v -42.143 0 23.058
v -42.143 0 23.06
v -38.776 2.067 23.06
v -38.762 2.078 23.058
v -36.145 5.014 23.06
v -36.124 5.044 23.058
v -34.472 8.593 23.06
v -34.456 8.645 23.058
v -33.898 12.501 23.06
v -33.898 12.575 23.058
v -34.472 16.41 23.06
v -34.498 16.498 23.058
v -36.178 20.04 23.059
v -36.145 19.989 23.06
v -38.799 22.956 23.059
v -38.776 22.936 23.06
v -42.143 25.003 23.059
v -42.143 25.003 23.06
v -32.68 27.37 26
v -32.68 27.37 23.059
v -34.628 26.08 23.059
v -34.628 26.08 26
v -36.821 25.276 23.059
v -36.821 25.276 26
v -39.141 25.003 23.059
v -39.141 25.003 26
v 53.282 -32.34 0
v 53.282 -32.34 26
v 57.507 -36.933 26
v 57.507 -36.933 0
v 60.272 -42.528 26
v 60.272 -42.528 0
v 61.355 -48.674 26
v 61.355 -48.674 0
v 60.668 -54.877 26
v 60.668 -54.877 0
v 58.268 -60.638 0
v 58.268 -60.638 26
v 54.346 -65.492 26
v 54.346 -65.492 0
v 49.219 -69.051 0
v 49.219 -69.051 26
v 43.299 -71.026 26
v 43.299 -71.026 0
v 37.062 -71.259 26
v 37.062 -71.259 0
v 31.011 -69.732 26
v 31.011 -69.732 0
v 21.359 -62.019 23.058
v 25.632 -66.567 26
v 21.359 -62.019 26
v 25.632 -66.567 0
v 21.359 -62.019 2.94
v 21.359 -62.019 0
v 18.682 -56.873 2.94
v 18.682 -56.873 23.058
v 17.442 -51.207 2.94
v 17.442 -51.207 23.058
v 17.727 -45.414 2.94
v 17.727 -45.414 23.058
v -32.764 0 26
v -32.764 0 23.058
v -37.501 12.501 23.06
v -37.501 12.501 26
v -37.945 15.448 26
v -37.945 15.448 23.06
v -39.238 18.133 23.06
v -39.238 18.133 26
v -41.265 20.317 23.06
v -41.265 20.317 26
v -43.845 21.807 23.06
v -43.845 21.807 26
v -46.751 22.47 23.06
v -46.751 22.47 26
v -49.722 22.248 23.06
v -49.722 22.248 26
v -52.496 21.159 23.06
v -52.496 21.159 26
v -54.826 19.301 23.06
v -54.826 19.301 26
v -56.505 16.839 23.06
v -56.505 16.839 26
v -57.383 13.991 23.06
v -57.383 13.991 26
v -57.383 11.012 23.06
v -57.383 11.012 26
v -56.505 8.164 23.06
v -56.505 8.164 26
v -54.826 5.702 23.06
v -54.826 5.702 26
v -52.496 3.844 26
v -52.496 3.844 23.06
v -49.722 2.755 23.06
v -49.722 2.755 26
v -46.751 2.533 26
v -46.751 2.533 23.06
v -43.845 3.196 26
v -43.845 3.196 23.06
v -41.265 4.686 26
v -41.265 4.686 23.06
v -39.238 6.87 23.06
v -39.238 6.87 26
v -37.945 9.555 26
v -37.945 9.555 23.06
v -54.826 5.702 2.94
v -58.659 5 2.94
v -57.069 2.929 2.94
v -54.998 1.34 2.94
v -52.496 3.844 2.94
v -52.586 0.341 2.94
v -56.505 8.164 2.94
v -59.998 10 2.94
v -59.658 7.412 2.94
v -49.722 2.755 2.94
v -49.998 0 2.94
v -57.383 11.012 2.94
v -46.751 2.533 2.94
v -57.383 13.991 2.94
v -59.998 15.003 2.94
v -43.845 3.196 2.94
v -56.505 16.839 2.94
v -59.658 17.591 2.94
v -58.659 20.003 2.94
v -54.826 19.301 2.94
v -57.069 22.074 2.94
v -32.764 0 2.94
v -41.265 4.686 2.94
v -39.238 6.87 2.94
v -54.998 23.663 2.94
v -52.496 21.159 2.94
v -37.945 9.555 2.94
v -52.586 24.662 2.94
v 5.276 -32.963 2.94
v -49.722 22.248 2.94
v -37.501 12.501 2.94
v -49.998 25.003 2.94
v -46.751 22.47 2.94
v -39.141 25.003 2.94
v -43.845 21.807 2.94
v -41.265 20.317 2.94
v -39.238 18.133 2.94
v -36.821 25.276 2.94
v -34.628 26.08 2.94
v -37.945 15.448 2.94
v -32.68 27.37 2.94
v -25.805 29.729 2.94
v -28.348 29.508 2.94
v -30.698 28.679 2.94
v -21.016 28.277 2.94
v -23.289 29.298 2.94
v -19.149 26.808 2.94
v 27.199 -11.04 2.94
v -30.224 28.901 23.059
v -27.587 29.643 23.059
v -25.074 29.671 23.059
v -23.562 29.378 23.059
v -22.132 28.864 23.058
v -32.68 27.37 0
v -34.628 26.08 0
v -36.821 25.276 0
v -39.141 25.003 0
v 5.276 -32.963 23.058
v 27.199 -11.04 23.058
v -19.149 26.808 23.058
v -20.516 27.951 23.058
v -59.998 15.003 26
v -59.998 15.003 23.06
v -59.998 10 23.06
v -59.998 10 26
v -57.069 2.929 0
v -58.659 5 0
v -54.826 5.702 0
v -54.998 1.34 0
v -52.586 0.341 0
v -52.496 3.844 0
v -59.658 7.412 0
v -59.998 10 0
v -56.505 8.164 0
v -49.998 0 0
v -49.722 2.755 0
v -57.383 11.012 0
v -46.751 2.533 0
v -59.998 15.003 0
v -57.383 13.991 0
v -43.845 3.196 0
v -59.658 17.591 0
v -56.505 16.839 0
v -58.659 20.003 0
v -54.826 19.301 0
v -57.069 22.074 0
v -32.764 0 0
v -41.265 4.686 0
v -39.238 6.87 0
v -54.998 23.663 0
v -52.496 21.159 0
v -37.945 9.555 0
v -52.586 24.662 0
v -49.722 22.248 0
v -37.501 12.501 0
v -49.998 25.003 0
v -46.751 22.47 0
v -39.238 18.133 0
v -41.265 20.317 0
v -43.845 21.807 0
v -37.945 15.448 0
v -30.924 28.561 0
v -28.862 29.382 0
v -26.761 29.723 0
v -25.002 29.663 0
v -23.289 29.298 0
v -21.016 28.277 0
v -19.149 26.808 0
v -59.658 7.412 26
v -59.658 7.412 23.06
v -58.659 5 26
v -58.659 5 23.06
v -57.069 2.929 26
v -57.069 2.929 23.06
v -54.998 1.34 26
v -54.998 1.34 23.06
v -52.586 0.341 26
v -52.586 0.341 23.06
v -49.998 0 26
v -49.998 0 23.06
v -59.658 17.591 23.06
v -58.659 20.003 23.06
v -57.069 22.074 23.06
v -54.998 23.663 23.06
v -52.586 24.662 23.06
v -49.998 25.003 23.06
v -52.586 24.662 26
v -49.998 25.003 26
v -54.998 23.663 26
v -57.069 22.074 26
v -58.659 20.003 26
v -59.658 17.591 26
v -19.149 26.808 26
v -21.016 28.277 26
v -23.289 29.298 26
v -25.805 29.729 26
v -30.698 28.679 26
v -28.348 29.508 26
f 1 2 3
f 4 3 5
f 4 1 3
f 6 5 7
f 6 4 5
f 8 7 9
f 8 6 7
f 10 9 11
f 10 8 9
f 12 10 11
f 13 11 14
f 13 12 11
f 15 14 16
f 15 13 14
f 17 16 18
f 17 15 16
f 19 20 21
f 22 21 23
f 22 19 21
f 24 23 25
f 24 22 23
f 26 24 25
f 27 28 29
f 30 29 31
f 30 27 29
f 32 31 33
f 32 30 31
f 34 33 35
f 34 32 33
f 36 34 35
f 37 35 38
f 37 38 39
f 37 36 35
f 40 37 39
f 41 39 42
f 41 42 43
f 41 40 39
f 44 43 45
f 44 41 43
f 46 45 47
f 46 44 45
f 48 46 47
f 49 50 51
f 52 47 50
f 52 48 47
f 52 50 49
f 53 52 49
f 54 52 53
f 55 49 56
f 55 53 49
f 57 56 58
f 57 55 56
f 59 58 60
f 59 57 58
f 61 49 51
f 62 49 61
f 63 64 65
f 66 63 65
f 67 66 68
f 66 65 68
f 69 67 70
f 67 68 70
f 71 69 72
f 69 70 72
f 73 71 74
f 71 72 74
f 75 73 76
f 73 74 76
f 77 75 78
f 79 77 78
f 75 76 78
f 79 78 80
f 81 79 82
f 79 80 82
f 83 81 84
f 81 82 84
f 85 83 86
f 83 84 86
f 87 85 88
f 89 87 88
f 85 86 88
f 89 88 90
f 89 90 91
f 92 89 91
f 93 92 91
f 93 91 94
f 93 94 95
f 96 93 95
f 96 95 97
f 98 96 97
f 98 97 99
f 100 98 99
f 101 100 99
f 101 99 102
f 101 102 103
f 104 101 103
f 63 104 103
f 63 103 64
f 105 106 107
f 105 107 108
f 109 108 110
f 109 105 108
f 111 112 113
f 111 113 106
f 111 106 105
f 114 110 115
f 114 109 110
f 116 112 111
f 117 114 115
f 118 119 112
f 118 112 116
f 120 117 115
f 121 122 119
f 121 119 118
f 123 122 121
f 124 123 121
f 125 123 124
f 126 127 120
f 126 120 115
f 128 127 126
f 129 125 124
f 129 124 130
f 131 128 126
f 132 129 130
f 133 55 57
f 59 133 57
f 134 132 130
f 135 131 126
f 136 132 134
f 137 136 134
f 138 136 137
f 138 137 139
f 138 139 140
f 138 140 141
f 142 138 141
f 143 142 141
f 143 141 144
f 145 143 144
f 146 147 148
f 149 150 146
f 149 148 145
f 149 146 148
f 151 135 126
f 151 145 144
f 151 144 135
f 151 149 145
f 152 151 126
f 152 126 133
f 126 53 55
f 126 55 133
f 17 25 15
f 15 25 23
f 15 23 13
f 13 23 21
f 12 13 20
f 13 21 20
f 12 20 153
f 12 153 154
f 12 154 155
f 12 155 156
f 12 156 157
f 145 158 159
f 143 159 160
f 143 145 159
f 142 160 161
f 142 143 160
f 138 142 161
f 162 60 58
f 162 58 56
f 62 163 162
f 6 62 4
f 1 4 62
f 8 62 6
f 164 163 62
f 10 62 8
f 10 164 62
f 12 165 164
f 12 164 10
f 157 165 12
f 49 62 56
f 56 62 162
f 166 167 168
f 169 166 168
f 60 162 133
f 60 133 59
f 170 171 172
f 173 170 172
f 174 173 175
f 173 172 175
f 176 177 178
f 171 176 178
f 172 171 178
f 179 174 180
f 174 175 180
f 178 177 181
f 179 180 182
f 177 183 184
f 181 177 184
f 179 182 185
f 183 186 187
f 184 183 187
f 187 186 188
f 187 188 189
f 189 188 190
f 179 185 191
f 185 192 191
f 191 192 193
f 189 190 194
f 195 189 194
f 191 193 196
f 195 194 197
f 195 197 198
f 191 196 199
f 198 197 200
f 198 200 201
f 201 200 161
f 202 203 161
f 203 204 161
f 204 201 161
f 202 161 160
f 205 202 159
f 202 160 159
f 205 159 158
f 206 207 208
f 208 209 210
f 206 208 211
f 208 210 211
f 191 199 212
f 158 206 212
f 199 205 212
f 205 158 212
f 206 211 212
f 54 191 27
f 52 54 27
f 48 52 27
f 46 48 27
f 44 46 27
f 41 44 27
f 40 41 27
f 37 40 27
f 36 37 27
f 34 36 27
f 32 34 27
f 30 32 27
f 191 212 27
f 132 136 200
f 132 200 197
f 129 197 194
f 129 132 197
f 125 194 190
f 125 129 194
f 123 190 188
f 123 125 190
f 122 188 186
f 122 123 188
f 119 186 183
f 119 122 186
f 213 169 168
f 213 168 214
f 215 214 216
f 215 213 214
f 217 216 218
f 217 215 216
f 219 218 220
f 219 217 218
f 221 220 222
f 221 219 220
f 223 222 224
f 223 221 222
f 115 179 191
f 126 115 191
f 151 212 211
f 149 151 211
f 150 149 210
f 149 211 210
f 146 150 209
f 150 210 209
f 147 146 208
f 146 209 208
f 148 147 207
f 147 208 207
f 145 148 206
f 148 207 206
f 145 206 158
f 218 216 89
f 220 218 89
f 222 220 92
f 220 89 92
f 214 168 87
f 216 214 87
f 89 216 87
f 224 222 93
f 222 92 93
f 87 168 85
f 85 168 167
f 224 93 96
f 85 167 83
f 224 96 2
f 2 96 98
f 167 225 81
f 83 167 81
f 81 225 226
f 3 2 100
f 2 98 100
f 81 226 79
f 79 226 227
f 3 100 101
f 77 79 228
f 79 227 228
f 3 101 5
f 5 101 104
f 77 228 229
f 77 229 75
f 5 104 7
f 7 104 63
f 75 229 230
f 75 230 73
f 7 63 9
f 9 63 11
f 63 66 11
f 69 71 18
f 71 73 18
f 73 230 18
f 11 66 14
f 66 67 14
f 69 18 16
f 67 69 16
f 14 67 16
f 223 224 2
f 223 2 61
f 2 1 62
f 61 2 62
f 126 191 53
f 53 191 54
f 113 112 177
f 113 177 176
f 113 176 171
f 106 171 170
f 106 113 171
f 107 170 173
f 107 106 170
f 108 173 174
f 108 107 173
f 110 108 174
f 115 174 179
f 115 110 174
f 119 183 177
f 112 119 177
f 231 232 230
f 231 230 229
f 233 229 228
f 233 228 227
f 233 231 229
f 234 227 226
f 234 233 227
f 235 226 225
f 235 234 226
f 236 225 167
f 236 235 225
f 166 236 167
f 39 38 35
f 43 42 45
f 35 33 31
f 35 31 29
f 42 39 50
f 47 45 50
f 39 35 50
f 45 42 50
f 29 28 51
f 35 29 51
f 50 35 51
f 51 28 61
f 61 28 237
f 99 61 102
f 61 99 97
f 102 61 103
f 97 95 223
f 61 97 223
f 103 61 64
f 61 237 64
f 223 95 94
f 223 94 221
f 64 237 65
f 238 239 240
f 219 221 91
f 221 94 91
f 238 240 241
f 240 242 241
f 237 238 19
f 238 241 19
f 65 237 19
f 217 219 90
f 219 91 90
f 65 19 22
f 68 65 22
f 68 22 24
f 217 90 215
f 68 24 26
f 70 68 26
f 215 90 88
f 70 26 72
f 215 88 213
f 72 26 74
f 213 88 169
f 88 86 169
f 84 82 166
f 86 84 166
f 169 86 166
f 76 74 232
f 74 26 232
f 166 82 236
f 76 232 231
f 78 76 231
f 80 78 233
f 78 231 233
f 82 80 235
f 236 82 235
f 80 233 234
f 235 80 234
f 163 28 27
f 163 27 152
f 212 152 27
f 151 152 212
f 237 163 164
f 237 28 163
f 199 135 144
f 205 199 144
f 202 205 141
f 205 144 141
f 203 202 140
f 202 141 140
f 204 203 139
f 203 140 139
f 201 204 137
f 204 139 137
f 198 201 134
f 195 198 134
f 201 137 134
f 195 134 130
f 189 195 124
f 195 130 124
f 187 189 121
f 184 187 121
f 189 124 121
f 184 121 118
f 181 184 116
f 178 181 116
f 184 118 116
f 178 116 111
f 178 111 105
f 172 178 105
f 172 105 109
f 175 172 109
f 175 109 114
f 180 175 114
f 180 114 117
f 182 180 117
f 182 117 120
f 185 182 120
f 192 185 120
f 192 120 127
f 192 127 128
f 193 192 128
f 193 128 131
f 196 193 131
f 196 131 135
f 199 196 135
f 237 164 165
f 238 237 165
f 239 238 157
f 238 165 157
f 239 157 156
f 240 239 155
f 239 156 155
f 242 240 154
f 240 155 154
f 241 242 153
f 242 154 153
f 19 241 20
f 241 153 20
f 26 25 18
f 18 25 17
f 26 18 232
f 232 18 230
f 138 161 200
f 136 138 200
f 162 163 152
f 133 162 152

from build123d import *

# Parameters (mm, degrees)
EXTRUDE_1_DEPTH      = 26
SKETCH_4_R           = 9.996910884
CUT_EXTRUDE_2_DEPTH  = 26
FILLET_1_R           = 10
FILLET_2_R           = 10
CUT_EXTRUDE_4_DEPTH  = 26
SKETCH_8_R           = 13.6
CUT_EXTRUDE_5_DEPTH  = 20.12
EXTRUDE_2_DEPTH      = 26
FILLET_3_R           = 3
CUT_EXTRUDE_6_DEPTH  = 30
FILLET_9_R           = 10
FILLET_10_R          = 3
FILLET_11_R          = 10
CUT_EXTRUDE_7_DEPTH  = 30
SKETCH_13_W          = 20.118493956
SKETCH_13_H          = 70
CUT_EXTRUDE_8_DEPTH  = 44.75
CUT_EXTRUDE_9_DEPTH  = 44.75
SKETCH_15_R          = 22
EXTRUDE_3_DEPTH      = 26
EXTRUDE_4_REACH      = 99.657
CUT_EXTRUDE_13_DEPTH = 20
EXTRUDE_START        = -2.941506044
EXTRUDE_5_DEPTH      = 2.941506044
EXTRUDE_6_DEPTH      = 2.94


with BuildPart() as part:
    # 草图1 → 凸台-拉伸1 (new body)
    with BuildSketch(Plane.XY):
        Polygon((0, 0), (60.004097951, 0), (60.004097951, 25.002996284), (-59.998288516, 25.002996284), (-59.998288516, 0), align=None)
    extrude(amount=EXTRUDE_1_DEPTH)

    # 草图4 → 切除-拉伸2 (cut)
    with BuildSketch(Plane.XY.offset(26)):
        with Locations((-47.497668288, 12.501498142)):
            Circle(SKETCH_4_R)
    extrude(amount=-CUT_EXTRUDE_2_DEPTH, mode=Mode.SUBTRACT)

    # 圆角1
    fillet_1_edges = [part.edges().sort_by_distance(p)[0] for p in [
        (-59.998288516, 25.002996284, 13),
    ]]
    fillet(fillet_1_edges, radius=FILLET_1_R)

    # 圆角2
    fillet_2_edges = [part.edges().sort_by_distance(p)[0] for p in [
        (-59.998288516, 0, 13),
    ]]
    fillet(fillet_2_edges, radius=FILLET_2_R)

    # 草图7 → 切除-拉伸4 (cut)
    with BuildSketch(Plane(origin=(0, 25.002996284, 0), x_dir=(1, 0, 0), z_dir=(0, 1, 0))):
        Polygon((-37.501471928, -23.058493956), (-36.401101967, -23.058493956), (-36.401101967, -2.94), (-37.501471928, -2.94), (-62.053584156, -2.94), (-62.053584156, -23.058493956), align=None)
    extrude(amount=-CUT_EXTRUDE_4_DEPTH, mode=Mode.SUBTRACT)

    # 草图8 → 切除-拉伸5 (cut)
    with BuildSketch(Plane.XY.offset(2.94)):
        with Locations((-47.497668288, 12.501498142)):
            Circle(SKETCH_8_R)
    extrude(amount=CUT_EXTRUDE_5_DEPTH, mode=Mode.SUBTRACT)

    # 草图9 → 凸台-拉伸2 (add)
    with BuildSketch(Plane.XY.offset(26)):
        Polygon((-34.9988745, 25.002996284), (-22.500080712, 12.501498142), (-27.68722448, 0), (39.366276038, -67.053500518), (48.202948014, -58.216828542), (57.0397416, -49.380034956), (-17.34328964, 25.002996284), (-26.17108207, 33.830788714), align=None)
    extrude(amount=-EXTRUDE_2_DEPTH)

    # 圆角3
    fillet_3_edges = [part.edges().sort_by_distance(p)[0] for p in [
        (-36.401101967, 0, 12.999246978),
        (-36.401101967, 20.36446297, 12.999246978),
        (-36.401101967, 4.638533314, 12.999246978),
    ]]
    fillet(fillet_3_edges, radius=FILLET_3_R)

    # 草图10 → 切除-拉伸6 (cut)
    with BuildSketch(Plane.XY.offset(26)):
        Polygon((7.659706645, 0), (60.004097951, 0), (60.004097951, 25.002996284), (-17.34328964, 25.002996284), align=None)
    extrude(amount=-CUT_EXTRUDE_6_DEPTH, mode=Mode.SUBTRACT)

    # 圆角9
    # the kernel refuses this fillet: 10 mm, written as the material it adds along each edge
    with BuildSketch(Plane(origin=(-34.9988745, 25.002996284, 26), x_dir=(-1, 0, 0), z_dir=(0, 0, -1))) as fillet_9_piece_1_section:
        with BuildLine():
            CenterArc((FILLET_9_R * 0.414213562373, FILLET_9_R), FILLET_9_R, 225, 45)
            Line((-FILLET_9_R * 0.292893218813, FILLET_9_R * 0.292893218813), (0, 0))
            Line((0, 0), (FILLET_9_R * 0.414213562373, 0))
        make_face()
    fillet_9_piece_1 = extrude(amount=26, mode=Mode.PRIVATE)
    fillet_9_piece_1 = split(fillet_9_piece_1, bisect_by=Plane(origin=(-36.401101967, 24.986097048, 24.529246978), z_dir=(-1, 0, 0)), keep=Keep.TOP, mode=Mode.PRIVATE)
    fillet_9_piece_1 = split(fillet_9_piece_1, bisect_by=Plane(origin=(-37.504554949, 24.986097048, 23.058493956), z_dir=(0, 0, 1)), keep=Keep.TOP, mode=Mode.PRIVATE)
    add(fillet_9_piece_1)
    with BuildSketch(Plane(origin=(-34.9988745, 25.002996284, 26), x_dir=(-1, 0, 0), z_dir=(0, 0, -1))) as fillet_9_piece_2_section:
        with BuildLine():
            CenterArc((FILLET_9_R * 0.414213562373, FILLET_9_R), FILLET_9_R, 225, 45)
            Line((-FILLET_9_R * 0.292893218813, FILLET_9_R * 0.292893218813), (0, 0))
            Line((0, 0), (FILLET_9_R * 0.414213562373, 0))
        make_face()
    fillet_9_piece_2 = extrude(amount=26, mode=Mode.PRIVATE)
    fillet_9_piece_2 = split(fillet_9_piece_2, bisect_by=Plane(origin=(-36.401101967, 25.815006688, 24.529246978), z_dir=(1, 0, 0)), keep=Keep.TOP, mode=Mode.PRIVATE)
    fillet_9_piece_2 = split(fillet_9_piece_2, bisect_by=Plane(origin=(-34.567927652, 25.815006688, 23.058493956), z_dir=(0, 0, 1)), keep=Keep.TOP, mode=Mode.PRIVATE)
    add(fillet_9_piece_2)
    with BuildSketch(Plane(origin=(-34.9988745, 25.002996284, 26), x_dir=(-1, 0, 0), z_dir=(0, 0, -1))) as fillet_9_piece_3_section:
        with BuildLine():
            CenterArc((FILLET_9_R * 0.414213562373, FILLET_9_R), FILLET_9_R, 225, 45)
            Line((-FILLET_9_R * 0.292893218813, FILLET_9_R * 0.292893218813), (0, 0))
            Line((0, 0), (FILLET_9_R * 0.414213562373, 0))
        make_face()
    fillet_9_piece_3 = extrude(amount=26, mode=Mode.PRIVATE)
    fillet_9_piece_3 = split(fillet_9_piece_3, bisect_by=Plane(origin=(-34.567927652, 25.815006688, 2.94), z_dir=(0, 0, 1)), keep=Keep.TOP, mode=Mode.PRIVATE)
    fillet_9_piece_3 = split(fillet_9_piece_3, bisect_by=Plane(origin=(-36.401101967, 25.815006688, 12.999246978), z_dir=(1, 0, 0)), keep=Keep.TOP, mode=Mode.PRIVATE)
    fillet_9_piece_3 = split(fillet_9_piece_3, bisect_by=Plane(origin=(-34.567927652, 25.815006688, 23.058493956), z_dir=(0, 0, -1)), keep=Keep.TOP, mode=Mode.PRIVATE)
    add(fillet_9_piece_3)
    with BuildSketch(Plane(origin=(-34.9988745, 25.002996284, 26), x_dir=(-1, 0, 0), z_dir=(0, 0, -1))) as fillet_9_piece_4_section:
        with BuildLine():
            CenterArc((FILLET_9_R * 0.414213562373, FILLET_9_R), FILLET_9_R, 225, 45)
            Line((-FILLET_9_R * 0.292893218813, FILLET_9_R * 0.292893218813), (0, 0))
            Line((0, 0), (FILLET_9_R * 0.414213562373, 0))
        make_face()
    fillet_9_piece_4 = extrude(amount=26, mode=Mode.PRIVATE)
    fillet_9_piece_4 = split(fillet_9_piece_4, bisect_by=Plane(origin=(-37.504554949, 24.986097048, 2.94), z_dir=(0, 0, -1)), keep=Keep.TOP, mode=Mode.PRIVATE)
    fillet_9_piece_4 = split(fillet_9_piece_4, bisect_by=Plane(origin=(-36.401101967, 24.986097048, 1.47), z_dir=(-1, 0, 0)), keep=Keep.TOP, mode=Mode.PRIVATE)
    add(fillet_9_piece_4)
    with BuildSketch(Plane(origin=(-34.9988745, 25.002996284, 26), x_dir=(-1, 0, 0), z_dir=(0, 0, -1))) as fillet_9_piece_5_section:
        with BuildLine():
            CenterArc((FILLET_9_R * 0.414213562373, FILLET_9_R), FILLET_9_R, 225, 45)
            Line((-FILLET_9_R * 0.292893218813, FILLET_9_R * 0.292893218813), (0, 0))
            Line((0, 0), (FILLET_9_R * 0.414213562373, 0))
        make_face()
    fillet_9_piece_5 = extrude(amount=26, mode=Mode.PRIVATE)
    fillet_9_piece_5 = split(fillet_9_piece_5, bisect_by=Plane(origin=(-34.567927652, 25.815006688, 2.94), z_dir=(0, 0, -1)), keep=Keep.TOP, mode=Mode.PRIVATE)
    fillet_9_piece_5 = split(fillet_9_piece_5, bisect_by=Plane(origin=(-36.401101967, 25.815006688, 1.47), z_dir=(1, 0, 0)), keep=Keep.TOP, mode=Mode.PRIVATE)
    add(fillet_9_piece_5)

    # 圆角10
    fillet_10_edges = [part.edges().sort_by_distance(p)[0] for p in [
        (-36.401101967, 25.385673201, 12.999246978),
    ]]
    fillet(fillet_10_edges, radius=FILLET_10_R)

    # 圆角11
    fillet_11_edges = [part.edges().sort_by_distance(p)[0] for p in [
        (-26.17108207, 33.830788714, 13),
    ]]
    fillet(fillet_11_edges, radius=FILLET_11_R)

    # 草图12 → 切除-拉伸7 (cut)
    with BuildSketch(Plane(origin=(3.829853322, 3.829853322, 0), x_dir=(0, 0, -1), z_dir=(0.7071067811865404, 0.7071067811865547, 0))):
        Polygon((-12.999246978, 43.121170069), (-9.998089183, 43.121170069), (-9.998089183, 23.118852005), (-15.995491838, 23.118852005), (-15.995491838, 43.121170069), align=None)
    extrude(amount=-CUT_EXTRUDE_7_DEPTH, mode=Mode.SUBTRACT)

    # 草图13 → 切除-拉伸8 (cut, symmetric)
    with BuildSketch(Plane(origin=(3.829853322, 3.829853322, 0), x_dir=(0, 0, -1), z_dir=(0.7071067811865404, 0.7071067811865547, 0))):
        with Locations((-12.999246978, 7.961145372)):
            Rectangle(SKETCH_13_W, SKETCH_13_H)
    extrude(amount=CUT_EXTRUDE_8_DEPTH, both=True, mode=Mode.SUBTRACT)

    # 草图14 → 切除-拉伸9 (cut, symmetric)
    with BuildSketch(Plane(origin=(3.829853322, 3.829853322, 0), x_dir=(0, 0, -1), z_dir=(0.7071067811865404, 0.7071067811865547, 0))):
        Polygon((-23.06, 55.962849268), (-23.058493956, 36.05981453), (-2.94, 36.05981453), (-2.94, 55.962849268), align=None)
    extrude(amount=CUT_EXTRUDE_9_DEPTH, both=True, mode=Mode.SUBTRACT)

    # 草图15 → 凸台-拉伸3 (add)
    with BuildSketch(Plane(origin=(0, 0, 0), x_dir=(-1, 0, 0), z_dir=(0, 0, -1))):
        with Locations((-39.366276038, -49.380034956)):
            Circle(SKETCH_15_R)
    extrude(amount=-EXTRUDE_3_DEPTH)

    # 凸台-拉伸4: up to this face of the body (flat: up to its plane)
    extrude_4_end = Plane(part.part.faces().sort_by_distance((10.252727371, -21.880412524, 0))[0])
    # 草图16 → 凸台-拉伸4 (add, up to the picked face)
    with BuildSketch(Plane.XY.offset(26), mode=Mode.PRIVATE) as extrude_4_sk1:
        with BuildLine():
            Line((53.281607925, -32.339978076), (-19.148678719, 26.808385364))
            Line((-19.148678719, 26.808385364), (35.400190623, -27.740483979))
            ThreePointArc((35.400190623, -27.740483979), (44.846760764, -28.073597263), (53.281607925, -32.339978076))
        make_face()
    extrude_4_tool1 = split(extrude(extrude_4_sk1.sketch, amount=-EXTRUDE_4_REACH, mode=Mode.PRIVATE), bisect_by=extrude_4_end, keep=Keep.BOTH, mode=Mode.PRIVATE)
    add(extrude_4_tool1.solids().sort_by(Axis((21.577836, -9.730931, 26), (0, 0, -1)))[0])

    # 草图17 → 切除-拉伸13 (cut)
    with BuildSketch(Plane(origin=(3.829853322, 3.829853322, 0), x_dir=(0, 0, 1), z_dir=(-0.7071067811865404, -0.7071067811865548, 0))):
        Polygon((23.058493956, 32.496551656), (23.058493956, -27.038854628), (2.94, -27.038854628), (2.94, 32.428906565), (2.94, 35.354128857), (23.06, 35.354128857), align=None)
    extrude(amount=-CUT_EXTRUDE_13_DEPTH, mode=Mode.SUBTRACT)

    # 草图19 → 凸台-拉伸5 (add)
    with BuildSketch(Plane.XY.offset(26).offset(EXTRUDE_START)):
        with BuildLine():
            Line((-32.763505202, 0), (-27.68722448, 0))
            Line((-27.68722448, 0), (17.726725061, -45.413949541))
            ThreePointArc((17.726725061, -45.413949541), (17.874446419, -54.081232636), (21.358890569, -62.018629363))
            Line((21.358890569, -62.018629363), (-32.763505202, 0))
        make_face()
    extrude(amount=EXTRUDE_5_DEPTH)

    # 草图20 → 凸台-拉伸6 (add)
    with BuildSketch(Plane(origin=(0, 0, 0), x_dir=(-1, 0, 0), z_dir=(0, 0, -1))):
        with BuildLine():
            Line((-17.726725061, -45.413949541), (27.68722448, 0))
            Line((27.68722448, 0), (32.763505202, 0))
            Line((32.763505202, 0), (-21.358890569, -62.018629363))
            ThreePointArc((-21.358890569, -62.018629363), (-17.874446419, -54.081232636), (-17.726725061, -45.413949541))
        make_face()
    extrude(amount=-EXTRUDE_6_DEPTH)


solid = part.part
